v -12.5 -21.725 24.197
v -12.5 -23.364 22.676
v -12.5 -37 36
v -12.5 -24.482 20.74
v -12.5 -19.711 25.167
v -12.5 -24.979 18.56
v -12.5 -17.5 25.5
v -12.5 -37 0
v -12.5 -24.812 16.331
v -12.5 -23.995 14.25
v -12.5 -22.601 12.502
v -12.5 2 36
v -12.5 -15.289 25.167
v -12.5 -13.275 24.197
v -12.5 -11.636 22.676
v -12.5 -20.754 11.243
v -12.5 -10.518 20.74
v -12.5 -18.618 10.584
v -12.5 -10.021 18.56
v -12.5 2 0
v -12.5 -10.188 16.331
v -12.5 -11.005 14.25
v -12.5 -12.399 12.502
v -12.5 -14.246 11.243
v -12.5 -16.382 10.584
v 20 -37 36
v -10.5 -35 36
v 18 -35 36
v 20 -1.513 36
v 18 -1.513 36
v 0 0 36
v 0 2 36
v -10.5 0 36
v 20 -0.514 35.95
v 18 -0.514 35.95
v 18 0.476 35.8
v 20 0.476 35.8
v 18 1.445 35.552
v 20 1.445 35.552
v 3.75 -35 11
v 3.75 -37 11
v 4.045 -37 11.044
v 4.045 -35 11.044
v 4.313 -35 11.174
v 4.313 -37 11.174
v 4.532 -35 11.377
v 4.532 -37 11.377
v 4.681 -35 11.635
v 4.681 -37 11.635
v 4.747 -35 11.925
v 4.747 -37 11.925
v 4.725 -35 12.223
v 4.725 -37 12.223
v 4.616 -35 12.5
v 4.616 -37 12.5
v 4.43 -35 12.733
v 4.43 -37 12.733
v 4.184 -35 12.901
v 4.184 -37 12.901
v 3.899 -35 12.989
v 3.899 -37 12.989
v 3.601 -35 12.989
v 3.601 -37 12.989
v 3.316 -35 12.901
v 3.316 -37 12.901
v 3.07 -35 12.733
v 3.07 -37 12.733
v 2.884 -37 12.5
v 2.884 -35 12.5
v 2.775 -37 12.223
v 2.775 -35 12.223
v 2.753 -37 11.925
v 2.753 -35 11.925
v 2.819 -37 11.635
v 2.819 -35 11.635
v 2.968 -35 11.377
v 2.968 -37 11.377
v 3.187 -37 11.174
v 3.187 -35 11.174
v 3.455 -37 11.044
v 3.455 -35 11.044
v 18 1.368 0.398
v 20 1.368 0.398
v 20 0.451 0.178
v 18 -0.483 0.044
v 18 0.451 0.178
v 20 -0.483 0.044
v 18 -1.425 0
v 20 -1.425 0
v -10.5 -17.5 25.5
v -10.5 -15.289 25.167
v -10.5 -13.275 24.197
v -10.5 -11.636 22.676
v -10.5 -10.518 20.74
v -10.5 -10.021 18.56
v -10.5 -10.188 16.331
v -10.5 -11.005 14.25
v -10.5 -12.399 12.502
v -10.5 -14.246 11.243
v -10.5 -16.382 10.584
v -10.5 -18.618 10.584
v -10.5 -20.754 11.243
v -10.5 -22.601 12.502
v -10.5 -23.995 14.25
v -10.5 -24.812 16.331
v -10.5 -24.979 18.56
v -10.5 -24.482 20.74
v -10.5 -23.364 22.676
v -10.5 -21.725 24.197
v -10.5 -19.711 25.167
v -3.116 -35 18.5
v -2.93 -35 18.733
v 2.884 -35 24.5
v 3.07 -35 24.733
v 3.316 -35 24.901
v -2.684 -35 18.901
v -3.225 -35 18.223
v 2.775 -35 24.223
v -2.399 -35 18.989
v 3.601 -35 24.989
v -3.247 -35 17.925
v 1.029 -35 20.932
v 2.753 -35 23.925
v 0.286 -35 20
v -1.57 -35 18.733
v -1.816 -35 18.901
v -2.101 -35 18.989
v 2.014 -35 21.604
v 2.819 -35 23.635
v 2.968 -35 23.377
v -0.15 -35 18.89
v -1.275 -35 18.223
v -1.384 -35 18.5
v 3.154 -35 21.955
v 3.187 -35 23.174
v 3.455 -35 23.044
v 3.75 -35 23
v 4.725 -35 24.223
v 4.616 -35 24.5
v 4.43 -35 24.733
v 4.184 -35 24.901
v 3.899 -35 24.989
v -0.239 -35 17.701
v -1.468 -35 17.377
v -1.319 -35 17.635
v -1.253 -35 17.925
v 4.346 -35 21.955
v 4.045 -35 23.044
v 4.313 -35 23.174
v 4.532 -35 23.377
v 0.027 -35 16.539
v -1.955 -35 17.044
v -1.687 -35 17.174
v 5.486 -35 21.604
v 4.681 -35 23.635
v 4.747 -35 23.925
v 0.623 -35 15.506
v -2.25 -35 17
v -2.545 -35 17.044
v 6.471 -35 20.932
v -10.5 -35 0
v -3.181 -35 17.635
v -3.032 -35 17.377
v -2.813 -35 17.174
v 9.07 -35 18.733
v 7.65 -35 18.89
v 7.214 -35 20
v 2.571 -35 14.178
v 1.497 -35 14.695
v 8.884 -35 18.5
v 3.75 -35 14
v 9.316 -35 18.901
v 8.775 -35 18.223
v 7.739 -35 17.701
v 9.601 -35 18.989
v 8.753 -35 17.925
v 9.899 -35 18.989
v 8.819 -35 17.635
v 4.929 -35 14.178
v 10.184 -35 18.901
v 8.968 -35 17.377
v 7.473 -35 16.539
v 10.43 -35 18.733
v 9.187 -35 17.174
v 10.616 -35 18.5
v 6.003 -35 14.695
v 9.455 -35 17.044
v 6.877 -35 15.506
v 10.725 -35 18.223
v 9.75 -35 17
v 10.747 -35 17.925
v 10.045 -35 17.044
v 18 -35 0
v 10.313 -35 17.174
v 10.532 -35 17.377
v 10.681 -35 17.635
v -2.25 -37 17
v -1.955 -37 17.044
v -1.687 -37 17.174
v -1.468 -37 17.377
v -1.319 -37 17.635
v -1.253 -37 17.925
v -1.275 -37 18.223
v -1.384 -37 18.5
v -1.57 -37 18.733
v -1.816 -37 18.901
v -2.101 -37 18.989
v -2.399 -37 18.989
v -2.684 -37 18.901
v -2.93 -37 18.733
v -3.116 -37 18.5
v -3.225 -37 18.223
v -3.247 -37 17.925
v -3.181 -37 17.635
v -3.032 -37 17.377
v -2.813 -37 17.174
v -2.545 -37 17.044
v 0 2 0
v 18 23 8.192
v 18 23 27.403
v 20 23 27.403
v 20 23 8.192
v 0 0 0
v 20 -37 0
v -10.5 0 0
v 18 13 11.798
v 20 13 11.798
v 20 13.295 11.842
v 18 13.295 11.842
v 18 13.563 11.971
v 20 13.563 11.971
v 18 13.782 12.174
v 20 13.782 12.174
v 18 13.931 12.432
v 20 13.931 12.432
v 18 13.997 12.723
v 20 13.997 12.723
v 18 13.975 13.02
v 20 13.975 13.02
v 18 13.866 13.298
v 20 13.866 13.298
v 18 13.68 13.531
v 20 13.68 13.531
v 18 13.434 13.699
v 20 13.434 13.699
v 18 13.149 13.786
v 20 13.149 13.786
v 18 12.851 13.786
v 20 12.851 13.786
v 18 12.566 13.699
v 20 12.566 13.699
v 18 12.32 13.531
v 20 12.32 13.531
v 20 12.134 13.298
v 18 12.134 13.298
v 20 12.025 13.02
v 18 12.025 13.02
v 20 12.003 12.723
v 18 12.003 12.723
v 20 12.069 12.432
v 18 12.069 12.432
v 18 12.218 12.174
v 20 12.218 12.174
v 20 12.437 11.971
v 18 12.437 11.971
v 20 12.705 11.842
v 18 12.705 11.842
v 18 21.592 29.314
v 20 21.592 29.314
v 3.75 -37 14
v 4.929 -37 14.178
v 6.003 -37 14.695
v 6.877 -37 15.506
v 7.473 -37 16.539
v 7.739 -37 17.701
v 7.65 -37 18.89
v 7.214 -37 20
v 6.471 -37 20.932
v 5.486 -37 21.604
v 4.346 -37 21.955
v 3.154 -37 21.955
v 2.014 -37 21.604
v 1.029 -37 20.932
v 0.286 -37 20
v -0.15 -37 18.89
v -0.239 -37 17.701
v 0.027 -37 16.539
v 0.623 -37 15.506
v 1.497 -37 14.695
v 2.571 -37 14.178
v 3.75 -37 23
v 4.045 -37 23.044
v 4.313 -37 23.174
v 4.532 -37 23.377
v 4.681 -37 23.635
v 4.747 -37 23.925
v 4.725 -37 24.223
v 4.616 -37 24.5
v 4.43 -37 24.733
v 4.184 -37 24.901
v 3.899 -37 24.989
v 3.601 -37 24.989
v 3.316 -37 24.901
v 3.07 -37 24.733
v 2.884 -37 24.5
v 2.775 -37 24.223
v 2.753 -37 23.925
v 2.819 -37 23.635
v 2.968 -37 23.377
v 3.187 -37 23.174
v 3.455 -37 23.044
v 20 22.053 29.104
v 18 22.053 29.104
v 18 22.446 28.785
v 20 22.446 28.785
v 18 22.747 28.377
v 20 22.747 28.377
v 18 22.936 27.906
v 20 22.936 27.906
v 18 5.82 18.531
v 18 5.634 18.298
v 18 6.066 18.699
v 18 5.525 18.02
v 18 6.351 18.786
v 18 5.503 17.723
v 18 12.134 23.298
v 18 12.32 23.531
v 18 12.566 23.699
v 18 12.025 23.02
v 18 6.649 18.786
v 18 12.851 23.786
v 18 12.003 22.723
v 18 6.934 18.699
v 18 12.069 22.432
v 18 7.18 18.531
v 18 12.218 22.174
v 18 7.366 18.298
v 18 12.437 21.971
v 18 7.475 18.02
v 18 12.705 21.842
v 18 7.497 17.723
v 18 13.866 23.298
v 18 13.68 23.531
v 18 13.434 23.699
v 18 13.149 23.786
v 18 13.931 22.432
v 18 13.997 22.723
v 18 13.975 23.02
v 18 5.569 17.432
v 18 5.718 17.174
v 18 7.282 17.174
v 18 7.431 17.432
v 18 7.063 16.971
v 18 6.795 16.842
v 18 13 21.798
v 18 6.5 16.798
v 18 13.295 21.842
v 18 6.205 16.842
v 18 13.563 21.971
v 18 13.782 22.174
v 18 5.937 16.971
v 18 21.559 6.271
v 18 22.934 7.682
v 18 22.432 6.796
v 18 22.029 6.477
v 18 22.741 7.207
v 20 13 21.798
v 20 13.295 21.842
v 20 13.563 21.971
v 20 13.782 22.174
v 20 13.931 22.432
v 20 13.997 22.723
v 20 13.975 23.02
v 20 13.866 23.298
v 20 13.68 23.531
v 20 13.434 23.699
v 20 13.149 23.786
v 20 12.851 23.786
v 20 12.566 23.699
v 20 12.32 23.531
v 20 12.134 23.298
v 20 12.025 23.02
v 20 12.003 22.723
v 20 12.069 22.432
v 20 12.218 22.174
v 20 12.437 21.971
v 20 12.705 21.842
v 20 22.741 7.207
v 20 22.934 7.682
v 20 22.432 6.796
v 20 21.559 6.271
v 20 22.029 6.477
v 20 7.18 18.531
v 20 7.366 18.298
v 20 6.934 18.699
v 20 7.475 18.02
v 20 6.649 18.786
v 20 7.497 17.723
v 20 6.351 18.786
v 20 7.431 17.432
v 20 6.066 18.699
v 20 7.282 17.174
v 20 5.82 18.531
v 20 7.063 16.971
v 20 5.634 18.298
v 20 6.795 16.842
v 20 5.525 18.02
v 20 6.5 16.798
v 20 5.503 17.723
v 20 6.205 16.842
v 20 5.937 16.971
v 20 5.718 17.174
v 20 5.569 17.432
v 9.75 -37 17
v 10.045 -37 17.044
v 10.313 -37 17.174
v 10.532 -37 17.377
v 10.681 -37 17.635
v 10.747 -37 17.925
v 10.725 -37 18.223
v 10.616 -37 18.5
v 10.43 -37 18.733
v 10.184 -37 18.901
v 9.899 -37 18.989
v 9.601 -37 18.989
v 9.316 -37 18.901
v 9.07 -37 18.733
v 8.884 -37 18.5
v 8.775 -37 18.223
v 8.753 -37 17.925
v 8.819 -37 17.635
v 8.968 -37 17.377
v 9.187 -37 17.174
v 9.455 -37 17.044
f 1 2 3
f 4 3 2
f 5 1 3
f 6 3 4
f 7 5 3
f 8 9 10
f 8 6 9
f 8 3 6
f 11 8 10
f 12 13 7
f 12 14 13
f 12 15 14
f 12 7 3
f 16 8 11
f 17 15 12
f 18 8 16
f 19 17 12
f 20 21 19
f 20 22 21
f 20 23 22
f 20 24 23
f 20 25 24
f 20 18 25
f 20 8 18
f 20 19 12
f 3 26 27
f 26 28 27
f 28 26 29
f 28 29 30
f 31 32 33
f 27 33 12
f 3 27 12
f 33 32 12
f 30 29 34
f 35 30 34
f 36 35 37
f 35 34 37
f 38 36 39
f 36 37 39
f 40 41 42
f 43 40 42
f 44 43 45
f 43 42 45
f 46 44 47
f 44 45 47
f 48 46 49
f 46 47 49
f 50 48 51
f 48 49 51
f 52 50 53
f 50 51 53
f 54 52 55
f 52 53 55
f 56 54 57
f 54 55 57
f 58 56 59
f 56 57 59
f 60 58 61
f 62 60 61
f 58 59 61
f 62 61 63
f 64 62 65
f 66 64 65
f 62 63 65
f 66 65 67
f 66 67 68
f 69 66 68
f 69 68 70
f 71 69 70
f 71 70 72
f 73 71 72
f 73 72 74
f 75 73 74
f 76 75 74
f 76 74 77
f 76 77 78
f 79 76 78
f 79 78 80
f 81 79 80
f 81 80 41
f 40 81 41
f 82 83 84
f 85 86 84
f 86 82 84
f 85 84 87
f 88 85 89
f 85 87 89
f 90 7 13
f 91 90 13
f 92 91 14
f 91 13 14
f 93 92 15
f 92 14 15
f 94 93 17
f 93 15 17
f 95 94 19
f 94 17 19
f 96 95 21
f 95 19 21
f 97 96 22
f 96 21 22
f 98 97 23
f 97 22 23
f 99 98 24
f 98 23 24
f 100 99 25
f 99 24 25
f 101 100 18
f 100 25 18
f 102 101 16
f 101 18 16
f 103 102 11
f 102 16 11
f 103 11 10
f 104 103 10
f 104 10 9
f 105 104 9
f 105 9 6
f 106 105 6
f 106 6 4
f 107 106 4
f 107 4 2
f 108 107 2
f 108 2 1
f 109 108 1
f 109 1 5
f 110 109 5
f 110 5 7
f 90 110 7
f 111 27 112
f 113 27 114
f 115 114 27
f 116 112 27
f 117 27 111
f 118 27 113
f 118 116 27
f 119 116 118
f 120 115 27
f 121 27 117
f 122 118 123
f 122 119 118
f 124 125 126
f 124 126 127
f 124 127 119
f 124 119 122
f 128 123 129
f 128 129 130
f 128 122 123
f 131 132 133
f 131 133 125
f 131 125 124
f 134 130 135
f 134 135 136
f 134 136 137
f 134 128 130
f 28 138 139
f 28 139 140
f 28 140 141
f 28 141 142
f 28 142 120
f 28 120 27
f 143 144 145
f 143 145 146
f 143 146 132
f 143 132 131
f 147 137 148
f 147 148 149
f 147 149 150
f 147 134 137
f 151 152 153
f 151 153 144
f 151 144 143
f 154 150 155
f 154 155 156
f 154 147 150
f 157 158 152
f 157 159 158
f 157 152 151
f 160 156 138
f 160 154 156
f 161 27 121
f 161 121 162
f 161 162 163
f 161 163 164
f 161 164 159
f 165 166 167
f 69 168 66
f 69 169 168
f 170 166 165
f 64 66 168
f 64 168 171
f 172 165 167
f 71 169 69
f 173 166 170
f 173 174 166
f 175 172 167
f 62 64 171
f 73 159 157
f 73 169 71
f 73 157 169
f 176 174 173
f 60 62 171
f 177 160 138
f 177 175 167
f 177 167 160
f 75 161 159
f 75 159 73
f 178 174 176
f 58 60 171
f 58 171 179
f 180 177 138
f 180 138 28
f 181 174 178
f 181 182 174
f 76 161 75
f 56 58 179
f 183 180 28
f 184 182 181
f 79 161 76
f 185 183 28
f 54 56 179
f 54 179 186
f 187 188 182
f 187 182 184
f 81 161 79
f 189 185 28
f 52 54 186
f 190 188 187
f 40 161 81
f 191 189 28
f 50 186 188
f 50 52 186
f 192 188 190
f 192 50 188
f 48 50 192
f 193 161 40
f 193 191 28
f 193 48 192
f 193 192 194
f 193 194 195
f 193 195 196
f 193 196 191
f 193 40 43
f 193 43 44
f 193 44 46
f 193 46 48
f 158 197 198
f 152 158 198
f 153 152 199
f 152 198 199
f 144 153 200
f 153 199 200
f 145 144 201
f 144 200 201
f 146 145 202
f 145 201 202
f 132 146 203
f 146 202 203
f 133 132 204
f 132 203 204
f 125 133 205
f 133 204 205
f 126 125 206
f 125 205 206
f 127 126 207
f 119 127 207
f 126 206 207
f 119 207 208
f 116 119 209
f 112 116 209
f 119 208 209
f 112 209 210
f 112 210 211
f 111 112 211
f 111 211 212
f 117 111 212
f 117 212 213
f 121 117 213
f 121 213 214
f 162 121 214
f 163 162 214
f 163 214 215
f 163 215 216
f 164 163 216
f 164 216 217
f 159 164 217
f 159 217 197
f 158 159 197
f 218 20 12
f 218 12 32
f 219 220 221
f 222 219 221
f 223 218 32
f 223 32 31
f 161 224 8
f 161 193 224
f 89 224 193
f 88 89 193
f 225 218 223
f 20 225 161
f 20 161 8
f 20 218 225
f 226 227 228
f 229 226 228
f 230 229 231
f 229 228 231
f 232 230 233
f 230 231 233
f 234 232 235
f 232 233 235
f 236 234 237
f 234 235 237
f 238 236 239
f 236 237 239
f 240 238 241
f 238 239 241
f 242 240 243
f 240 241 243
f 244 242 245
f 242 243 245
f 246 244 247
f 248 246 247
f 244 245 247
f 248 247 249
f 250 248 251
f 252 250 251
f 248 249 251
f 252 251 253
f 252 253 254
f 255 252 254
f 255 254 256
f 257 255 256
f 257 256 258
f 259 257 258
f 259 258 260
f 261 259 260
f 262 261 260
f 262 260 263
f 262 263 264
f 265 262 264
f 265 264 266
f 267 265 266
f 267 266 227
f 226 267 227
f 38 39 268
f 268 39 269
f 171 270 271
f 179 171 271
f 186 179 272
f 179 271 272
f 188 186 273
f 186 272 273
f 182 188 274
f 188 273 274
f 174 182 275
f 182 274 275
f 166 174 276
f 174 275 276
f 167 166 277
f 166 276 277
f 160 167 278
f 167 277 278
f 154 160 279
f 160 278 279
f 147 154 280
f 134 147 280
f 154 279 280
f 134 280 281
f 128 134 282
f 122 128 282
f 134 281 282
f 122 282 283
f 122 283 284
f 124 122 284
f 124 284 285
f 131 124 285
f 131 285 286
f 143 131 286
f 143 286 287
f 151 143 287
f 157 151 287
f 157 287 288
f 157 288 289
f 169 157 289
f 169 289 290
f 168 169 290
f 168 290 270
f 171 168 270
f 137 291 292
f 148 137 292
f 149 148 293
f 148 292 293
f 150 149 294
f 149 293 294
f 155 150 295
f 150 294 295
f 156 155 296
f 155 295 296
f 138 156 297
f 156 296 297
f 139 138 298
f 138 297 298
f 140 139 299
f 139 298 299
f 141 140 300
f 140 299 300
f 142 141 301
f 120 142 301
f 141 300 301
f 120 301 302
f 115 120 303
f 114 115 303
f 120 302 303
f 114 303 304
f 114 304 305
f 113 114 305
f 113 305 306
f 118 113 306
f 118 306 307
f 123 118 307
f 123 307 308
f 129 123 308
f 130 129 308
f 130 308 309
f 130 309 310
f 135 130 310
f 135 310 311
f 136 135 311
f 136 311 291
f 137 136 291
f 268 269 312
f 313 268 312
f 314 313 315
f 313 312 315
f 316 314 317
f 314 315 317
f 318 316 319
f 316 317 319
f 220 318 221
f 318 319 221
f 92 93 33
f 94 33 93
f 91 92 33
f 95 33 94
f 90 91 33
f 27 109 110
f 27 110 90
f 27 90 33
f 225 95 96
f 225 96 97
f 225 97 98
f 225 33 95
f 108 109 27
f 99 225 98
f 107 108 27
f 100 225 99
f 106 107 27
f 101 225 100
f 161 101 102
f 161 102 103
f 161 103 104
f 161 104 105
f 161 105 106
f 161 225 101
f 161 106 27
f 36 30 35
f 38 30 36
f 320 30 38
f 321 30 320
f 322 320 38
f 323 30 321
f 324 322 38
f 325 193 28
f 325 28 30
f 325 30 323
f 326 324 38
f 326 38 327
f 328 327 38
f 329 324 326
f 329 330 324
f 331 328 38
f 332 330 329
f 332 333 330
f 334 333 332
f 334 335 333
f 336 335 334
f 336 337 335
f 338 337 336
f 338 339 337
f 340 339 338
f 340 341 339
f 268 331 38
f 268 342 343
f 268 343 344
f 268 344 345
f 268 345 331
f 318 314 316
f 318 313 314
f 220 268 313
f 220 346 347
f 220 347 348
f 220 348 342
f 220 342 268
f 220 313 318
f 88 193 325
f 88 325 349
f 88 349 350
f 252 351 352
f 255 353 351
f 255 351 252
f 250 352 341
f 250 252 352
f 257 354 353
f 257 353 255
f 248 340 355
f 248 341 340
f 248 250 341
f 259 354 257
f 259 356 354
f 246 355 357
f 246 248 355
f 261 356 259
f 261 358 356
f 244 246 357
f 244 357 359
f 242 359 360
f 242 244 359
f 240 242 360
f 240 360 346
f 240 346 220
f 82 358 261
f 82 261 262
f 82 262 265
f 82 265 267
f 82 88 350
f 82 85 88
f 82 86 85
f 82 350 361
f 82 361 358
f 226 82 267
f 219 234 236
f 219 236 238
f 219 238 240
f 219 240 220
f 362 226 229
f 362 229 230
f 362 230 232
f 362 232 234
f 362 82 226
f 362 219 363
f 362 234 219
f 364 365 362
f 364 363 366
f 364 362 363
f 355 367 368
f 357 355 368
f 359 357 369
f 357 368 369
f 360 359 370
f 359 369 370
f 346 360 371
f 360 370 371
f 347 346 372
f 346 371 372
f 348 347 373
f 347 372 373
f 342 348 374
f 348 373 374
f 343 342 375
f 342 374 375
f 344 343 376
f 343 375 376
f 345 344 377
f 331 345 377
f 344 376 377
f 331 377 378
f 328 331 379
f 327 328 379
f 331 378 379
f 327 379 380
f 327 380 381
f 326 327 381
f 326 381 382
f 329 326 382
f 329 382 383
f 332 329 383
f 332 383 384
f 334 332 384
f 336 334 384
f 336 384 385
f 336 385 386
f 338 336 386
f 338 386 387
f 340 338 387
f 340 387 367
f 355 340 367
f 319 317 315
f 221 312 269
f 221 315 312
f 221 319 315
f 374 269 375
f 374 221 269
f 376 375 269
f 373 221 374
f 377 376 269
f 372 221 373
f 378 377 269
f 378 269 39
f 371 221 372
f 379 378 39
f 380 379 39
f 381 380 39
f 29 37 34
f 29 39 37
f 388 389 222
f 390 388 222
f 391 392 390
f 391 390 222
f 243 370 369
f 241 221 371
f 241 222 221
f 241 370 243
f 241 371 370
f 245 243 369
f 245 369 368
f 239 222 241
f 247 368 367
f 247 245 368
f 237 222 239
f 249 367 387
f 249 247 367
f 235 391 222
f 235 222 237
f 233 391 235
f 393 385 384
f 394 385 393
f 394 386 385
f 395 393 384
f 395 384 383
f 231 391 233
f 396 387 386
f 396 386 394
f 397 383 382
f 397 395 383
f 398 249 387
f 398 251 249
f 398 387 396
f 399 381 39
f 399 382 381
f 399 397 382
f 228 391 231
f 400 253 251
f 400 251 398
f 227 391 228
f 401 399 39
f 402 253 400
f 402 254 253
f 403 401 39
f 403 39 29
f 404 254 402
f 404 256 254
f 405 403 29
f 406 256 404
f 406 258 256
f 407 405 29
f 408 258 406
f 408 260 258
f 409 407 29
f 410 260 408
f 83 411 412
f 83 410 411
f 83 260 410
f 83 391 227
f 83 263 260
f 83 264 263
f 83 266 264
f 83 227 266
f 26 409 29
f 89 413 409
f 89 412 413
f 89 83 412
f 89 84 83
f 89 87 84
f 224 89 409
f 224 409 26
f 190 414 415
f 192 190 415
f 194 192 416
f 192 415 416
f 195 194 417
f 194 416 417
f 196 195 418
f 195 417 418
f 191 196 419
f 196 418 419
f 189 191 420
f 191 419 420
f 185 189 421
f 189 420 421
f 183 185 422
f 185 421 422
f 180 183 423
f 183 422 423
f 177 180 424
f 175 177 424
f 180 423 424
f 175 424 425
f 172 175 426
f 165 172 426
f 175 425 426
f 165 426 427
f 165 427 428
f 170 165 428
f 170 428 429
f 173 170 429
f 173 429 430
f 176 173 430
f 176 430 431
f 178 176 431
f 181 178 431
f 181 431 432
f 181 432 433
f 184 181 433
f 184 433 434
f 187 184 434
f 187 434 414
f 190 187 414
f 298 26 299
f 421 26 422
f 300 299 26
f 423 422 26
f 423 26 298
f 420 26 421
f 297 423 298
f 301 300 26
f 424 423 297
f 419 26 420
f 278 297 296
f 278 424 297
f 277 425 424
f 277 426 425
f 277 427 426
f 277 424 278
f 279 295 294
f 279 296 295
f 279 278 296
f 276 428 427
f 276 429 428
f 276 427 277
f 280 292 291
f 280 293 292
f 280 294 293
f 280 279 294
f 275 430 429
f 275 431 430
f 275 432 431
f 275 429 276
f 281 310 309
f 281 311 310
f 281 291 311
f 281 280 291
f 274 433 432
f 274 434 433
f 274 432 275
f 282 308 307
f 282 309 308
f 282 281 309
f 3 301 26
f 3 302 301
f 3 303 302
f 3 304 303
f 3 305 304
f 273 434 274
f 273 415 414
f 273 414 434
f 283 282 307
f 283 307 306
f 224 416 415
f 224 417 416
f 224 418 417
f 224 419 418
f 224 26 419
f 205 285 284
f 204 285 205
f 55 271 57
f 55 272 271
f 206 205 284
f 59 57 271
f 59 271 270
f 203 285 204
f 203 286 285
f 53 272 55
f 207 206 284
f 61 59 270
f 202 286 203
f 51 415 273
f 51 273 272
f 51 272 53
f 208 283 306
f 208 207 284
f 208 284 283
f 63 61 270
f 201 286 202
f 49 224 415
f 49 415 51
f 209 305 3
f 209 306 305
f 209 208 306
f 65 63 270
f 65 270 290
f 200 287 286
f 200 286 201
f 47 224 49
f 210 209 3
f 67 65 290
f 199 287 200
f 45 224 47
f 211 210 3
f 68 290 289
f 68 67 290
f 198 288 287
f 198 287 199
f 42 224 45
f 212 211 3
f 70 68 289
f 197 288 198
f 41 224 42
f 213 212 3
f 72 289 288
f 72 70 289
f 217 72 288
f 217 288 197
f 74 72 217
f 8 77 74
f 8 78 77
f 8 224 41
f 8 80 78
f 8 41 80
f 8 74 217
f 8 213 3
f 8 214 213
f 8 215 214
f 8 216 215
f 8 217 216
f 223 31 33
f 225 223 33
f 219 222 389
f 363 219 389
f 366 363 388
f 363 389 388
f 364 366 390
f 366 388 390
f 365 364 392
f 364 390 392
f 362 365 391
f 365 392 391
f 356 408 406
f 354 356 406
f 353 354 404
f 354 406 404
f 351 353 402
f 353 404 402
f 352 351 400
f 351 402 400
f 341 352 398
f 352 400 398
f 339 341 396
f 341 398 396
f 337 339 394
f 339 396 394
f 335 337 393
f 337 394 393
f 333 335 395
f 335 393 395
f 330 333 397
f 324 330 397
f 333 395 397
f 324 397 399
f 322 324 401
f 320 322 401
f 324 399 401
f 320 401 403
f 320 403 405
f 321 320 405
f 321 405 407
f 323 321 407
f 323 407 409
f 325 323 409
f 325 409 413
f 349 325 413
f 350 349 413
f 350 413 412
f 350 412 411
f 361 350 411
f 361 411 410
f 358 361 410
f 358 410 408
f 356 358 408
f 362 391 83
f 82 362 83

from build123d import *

# Parameters (mm, degrees)
BOSS_EXTRUDE1_DEPTH = 36
SKETCH2_OUTSIDE_W   = 53.43
SKETCH2_OUTSIDE_H   = 77.43
SKETCH2_OUTSIDE_R   = 1
CUT_EXTRUDE2_DEPTH  = 5
SKETCH3_R           = 7.5
CUT_EXTRUDE3_DEPTH  = 5
SKETCH4_R           = 4
SKETCH4_R_2         = 1
CUT_EXTRUDE5_DEPTH  = 5


with BuildPart() as part:
    # Sketch1 → Boss-Extrude1 (new body)
    with BuildSketch(Plane.XY):
        Polygon((0, 0), (-10.5, 0), (-10.5, -35), (18, -35), (18, 23), (20, 23), (20, -37), (-12.5, -37), (-12.5, 2), (0, 2), align=None)
    extrude(amount=BOSS_EXTRUDE1_DEPTH)

    # Sketch2 outside → Cut-Extrude2 (cut)
    # profile 1 of 4: a face of its own
    with BuildSketch(Plane(origin=(20, 0, 0), x_dir=(0, 0, -1), z_dir=(1, 0, 0))):
        with Locations((-18, -7)):
            Rectangle(SKETCH2_OUTSIDE_W, SKETCH2_OUTSIDE_H)
        with BuildLine():
            Line((-27.403498968, 23), (-8.191734442, 23))
            ThreePointArc((-8.191734442, 23), (-6.991166755, 22.599574078), (-6.271337492, 21.55863723))
            Line((-6.271337492, 21.55863723), (-0.398015251, 1.368235471))
            ThreePointArc((-0.398015251, 1.368235471), (-0.100003851, -0.014250056), (0, -1.424950681))
            Line((0, -1.424950681), (0, -37))
            Line((0, -37), (-36, -37))
            Line((-36, -37), (-36, -1.512851617))
            ThreePointArc((-36, -1.512851617), (-35.887491609, -0.01702085), (-35.552498063, 1.445151214))
            Line((-35.552498063, 1.445151214), (-29.313998581, 21.591600566))
            ThreePointArc((-29.313998581, 21.591600566), (-28.590259025, 22.609844889), (-27.403498968, 23))
        make_face(mode=Mode.SUBTRACT)
    # profile 2 of 4: a face of its own
    with BuildSketch(Plane(origin=(20, 0, 0), x_dir=(0, 0, -1), z_dir=(1, 0, 0))):
        with Locations((-17.797616705, 6.5)):
            Circle(SKETCH2_OUTSIDE_R)
    # profile 3 of 4: a face of its own
    with BuildSketch(Plane(origin=(20, 0, 0), x_dir=(0, 0, -1), z_dir=(1, 0, 0))):
        with Locations((-22.797616705, 13)):
            Circle(SKETCH2_OUTSIDE_R)
    # profile 4 of 4: a face of its own
    with BuildSketch(Plane(origin=(20, 0, 0), x_dir=(0, 0, -1), z_dir=(1, 0, 0))):
        with Locations((-12.797616705, 13)):
            Circle(SKETCH2_OUTSIDE_R)
    extrude(amount=-CUT_EXTRUDE2_DEPTH, mode=Mode.SUBTRACT)

    # Sketch3 → Cut-Extrude3 (cut)
    with BuildSketch(Plane.ZY.offset(12.5)):
        with Locations((18, -17.5)):
            Circle(SKETCH3_R)
    extrude(amount=-CUT_EXTRUDE3_DEPTH, mode=Mode.SUBTRACT)

    # Sketch4 → Cut-Extrude5 (cut)
    with BuildSketch(Plane.XZ.offset(37)):
        with Locations(Location((3.75, 18, 0), (0, 0, 270))):
            Circle(SKETCH4_R)
        with Locations(Location((3.75, 12, 0), (0, 0, 270))):
            Circle(SKETCH4_R_2)
        with Locations(Location((3.75, 24, 0), (0, 0, 270))):
            Circle(SKETCH4_R_2)
        with Locations(Location((9.75, 18, 0), (0, 0, 270))):
            Circle(SKETCH4_R_2)
        with Locations(Location((-2.25, 18, 0), (0, 0, 270))):
            Circle(SKETCH4_R_2)
    extrude(amount=-CUT_EXTRUDE5_DEPTH, mode=Mode.SUBTRACT)


solid = part.part
